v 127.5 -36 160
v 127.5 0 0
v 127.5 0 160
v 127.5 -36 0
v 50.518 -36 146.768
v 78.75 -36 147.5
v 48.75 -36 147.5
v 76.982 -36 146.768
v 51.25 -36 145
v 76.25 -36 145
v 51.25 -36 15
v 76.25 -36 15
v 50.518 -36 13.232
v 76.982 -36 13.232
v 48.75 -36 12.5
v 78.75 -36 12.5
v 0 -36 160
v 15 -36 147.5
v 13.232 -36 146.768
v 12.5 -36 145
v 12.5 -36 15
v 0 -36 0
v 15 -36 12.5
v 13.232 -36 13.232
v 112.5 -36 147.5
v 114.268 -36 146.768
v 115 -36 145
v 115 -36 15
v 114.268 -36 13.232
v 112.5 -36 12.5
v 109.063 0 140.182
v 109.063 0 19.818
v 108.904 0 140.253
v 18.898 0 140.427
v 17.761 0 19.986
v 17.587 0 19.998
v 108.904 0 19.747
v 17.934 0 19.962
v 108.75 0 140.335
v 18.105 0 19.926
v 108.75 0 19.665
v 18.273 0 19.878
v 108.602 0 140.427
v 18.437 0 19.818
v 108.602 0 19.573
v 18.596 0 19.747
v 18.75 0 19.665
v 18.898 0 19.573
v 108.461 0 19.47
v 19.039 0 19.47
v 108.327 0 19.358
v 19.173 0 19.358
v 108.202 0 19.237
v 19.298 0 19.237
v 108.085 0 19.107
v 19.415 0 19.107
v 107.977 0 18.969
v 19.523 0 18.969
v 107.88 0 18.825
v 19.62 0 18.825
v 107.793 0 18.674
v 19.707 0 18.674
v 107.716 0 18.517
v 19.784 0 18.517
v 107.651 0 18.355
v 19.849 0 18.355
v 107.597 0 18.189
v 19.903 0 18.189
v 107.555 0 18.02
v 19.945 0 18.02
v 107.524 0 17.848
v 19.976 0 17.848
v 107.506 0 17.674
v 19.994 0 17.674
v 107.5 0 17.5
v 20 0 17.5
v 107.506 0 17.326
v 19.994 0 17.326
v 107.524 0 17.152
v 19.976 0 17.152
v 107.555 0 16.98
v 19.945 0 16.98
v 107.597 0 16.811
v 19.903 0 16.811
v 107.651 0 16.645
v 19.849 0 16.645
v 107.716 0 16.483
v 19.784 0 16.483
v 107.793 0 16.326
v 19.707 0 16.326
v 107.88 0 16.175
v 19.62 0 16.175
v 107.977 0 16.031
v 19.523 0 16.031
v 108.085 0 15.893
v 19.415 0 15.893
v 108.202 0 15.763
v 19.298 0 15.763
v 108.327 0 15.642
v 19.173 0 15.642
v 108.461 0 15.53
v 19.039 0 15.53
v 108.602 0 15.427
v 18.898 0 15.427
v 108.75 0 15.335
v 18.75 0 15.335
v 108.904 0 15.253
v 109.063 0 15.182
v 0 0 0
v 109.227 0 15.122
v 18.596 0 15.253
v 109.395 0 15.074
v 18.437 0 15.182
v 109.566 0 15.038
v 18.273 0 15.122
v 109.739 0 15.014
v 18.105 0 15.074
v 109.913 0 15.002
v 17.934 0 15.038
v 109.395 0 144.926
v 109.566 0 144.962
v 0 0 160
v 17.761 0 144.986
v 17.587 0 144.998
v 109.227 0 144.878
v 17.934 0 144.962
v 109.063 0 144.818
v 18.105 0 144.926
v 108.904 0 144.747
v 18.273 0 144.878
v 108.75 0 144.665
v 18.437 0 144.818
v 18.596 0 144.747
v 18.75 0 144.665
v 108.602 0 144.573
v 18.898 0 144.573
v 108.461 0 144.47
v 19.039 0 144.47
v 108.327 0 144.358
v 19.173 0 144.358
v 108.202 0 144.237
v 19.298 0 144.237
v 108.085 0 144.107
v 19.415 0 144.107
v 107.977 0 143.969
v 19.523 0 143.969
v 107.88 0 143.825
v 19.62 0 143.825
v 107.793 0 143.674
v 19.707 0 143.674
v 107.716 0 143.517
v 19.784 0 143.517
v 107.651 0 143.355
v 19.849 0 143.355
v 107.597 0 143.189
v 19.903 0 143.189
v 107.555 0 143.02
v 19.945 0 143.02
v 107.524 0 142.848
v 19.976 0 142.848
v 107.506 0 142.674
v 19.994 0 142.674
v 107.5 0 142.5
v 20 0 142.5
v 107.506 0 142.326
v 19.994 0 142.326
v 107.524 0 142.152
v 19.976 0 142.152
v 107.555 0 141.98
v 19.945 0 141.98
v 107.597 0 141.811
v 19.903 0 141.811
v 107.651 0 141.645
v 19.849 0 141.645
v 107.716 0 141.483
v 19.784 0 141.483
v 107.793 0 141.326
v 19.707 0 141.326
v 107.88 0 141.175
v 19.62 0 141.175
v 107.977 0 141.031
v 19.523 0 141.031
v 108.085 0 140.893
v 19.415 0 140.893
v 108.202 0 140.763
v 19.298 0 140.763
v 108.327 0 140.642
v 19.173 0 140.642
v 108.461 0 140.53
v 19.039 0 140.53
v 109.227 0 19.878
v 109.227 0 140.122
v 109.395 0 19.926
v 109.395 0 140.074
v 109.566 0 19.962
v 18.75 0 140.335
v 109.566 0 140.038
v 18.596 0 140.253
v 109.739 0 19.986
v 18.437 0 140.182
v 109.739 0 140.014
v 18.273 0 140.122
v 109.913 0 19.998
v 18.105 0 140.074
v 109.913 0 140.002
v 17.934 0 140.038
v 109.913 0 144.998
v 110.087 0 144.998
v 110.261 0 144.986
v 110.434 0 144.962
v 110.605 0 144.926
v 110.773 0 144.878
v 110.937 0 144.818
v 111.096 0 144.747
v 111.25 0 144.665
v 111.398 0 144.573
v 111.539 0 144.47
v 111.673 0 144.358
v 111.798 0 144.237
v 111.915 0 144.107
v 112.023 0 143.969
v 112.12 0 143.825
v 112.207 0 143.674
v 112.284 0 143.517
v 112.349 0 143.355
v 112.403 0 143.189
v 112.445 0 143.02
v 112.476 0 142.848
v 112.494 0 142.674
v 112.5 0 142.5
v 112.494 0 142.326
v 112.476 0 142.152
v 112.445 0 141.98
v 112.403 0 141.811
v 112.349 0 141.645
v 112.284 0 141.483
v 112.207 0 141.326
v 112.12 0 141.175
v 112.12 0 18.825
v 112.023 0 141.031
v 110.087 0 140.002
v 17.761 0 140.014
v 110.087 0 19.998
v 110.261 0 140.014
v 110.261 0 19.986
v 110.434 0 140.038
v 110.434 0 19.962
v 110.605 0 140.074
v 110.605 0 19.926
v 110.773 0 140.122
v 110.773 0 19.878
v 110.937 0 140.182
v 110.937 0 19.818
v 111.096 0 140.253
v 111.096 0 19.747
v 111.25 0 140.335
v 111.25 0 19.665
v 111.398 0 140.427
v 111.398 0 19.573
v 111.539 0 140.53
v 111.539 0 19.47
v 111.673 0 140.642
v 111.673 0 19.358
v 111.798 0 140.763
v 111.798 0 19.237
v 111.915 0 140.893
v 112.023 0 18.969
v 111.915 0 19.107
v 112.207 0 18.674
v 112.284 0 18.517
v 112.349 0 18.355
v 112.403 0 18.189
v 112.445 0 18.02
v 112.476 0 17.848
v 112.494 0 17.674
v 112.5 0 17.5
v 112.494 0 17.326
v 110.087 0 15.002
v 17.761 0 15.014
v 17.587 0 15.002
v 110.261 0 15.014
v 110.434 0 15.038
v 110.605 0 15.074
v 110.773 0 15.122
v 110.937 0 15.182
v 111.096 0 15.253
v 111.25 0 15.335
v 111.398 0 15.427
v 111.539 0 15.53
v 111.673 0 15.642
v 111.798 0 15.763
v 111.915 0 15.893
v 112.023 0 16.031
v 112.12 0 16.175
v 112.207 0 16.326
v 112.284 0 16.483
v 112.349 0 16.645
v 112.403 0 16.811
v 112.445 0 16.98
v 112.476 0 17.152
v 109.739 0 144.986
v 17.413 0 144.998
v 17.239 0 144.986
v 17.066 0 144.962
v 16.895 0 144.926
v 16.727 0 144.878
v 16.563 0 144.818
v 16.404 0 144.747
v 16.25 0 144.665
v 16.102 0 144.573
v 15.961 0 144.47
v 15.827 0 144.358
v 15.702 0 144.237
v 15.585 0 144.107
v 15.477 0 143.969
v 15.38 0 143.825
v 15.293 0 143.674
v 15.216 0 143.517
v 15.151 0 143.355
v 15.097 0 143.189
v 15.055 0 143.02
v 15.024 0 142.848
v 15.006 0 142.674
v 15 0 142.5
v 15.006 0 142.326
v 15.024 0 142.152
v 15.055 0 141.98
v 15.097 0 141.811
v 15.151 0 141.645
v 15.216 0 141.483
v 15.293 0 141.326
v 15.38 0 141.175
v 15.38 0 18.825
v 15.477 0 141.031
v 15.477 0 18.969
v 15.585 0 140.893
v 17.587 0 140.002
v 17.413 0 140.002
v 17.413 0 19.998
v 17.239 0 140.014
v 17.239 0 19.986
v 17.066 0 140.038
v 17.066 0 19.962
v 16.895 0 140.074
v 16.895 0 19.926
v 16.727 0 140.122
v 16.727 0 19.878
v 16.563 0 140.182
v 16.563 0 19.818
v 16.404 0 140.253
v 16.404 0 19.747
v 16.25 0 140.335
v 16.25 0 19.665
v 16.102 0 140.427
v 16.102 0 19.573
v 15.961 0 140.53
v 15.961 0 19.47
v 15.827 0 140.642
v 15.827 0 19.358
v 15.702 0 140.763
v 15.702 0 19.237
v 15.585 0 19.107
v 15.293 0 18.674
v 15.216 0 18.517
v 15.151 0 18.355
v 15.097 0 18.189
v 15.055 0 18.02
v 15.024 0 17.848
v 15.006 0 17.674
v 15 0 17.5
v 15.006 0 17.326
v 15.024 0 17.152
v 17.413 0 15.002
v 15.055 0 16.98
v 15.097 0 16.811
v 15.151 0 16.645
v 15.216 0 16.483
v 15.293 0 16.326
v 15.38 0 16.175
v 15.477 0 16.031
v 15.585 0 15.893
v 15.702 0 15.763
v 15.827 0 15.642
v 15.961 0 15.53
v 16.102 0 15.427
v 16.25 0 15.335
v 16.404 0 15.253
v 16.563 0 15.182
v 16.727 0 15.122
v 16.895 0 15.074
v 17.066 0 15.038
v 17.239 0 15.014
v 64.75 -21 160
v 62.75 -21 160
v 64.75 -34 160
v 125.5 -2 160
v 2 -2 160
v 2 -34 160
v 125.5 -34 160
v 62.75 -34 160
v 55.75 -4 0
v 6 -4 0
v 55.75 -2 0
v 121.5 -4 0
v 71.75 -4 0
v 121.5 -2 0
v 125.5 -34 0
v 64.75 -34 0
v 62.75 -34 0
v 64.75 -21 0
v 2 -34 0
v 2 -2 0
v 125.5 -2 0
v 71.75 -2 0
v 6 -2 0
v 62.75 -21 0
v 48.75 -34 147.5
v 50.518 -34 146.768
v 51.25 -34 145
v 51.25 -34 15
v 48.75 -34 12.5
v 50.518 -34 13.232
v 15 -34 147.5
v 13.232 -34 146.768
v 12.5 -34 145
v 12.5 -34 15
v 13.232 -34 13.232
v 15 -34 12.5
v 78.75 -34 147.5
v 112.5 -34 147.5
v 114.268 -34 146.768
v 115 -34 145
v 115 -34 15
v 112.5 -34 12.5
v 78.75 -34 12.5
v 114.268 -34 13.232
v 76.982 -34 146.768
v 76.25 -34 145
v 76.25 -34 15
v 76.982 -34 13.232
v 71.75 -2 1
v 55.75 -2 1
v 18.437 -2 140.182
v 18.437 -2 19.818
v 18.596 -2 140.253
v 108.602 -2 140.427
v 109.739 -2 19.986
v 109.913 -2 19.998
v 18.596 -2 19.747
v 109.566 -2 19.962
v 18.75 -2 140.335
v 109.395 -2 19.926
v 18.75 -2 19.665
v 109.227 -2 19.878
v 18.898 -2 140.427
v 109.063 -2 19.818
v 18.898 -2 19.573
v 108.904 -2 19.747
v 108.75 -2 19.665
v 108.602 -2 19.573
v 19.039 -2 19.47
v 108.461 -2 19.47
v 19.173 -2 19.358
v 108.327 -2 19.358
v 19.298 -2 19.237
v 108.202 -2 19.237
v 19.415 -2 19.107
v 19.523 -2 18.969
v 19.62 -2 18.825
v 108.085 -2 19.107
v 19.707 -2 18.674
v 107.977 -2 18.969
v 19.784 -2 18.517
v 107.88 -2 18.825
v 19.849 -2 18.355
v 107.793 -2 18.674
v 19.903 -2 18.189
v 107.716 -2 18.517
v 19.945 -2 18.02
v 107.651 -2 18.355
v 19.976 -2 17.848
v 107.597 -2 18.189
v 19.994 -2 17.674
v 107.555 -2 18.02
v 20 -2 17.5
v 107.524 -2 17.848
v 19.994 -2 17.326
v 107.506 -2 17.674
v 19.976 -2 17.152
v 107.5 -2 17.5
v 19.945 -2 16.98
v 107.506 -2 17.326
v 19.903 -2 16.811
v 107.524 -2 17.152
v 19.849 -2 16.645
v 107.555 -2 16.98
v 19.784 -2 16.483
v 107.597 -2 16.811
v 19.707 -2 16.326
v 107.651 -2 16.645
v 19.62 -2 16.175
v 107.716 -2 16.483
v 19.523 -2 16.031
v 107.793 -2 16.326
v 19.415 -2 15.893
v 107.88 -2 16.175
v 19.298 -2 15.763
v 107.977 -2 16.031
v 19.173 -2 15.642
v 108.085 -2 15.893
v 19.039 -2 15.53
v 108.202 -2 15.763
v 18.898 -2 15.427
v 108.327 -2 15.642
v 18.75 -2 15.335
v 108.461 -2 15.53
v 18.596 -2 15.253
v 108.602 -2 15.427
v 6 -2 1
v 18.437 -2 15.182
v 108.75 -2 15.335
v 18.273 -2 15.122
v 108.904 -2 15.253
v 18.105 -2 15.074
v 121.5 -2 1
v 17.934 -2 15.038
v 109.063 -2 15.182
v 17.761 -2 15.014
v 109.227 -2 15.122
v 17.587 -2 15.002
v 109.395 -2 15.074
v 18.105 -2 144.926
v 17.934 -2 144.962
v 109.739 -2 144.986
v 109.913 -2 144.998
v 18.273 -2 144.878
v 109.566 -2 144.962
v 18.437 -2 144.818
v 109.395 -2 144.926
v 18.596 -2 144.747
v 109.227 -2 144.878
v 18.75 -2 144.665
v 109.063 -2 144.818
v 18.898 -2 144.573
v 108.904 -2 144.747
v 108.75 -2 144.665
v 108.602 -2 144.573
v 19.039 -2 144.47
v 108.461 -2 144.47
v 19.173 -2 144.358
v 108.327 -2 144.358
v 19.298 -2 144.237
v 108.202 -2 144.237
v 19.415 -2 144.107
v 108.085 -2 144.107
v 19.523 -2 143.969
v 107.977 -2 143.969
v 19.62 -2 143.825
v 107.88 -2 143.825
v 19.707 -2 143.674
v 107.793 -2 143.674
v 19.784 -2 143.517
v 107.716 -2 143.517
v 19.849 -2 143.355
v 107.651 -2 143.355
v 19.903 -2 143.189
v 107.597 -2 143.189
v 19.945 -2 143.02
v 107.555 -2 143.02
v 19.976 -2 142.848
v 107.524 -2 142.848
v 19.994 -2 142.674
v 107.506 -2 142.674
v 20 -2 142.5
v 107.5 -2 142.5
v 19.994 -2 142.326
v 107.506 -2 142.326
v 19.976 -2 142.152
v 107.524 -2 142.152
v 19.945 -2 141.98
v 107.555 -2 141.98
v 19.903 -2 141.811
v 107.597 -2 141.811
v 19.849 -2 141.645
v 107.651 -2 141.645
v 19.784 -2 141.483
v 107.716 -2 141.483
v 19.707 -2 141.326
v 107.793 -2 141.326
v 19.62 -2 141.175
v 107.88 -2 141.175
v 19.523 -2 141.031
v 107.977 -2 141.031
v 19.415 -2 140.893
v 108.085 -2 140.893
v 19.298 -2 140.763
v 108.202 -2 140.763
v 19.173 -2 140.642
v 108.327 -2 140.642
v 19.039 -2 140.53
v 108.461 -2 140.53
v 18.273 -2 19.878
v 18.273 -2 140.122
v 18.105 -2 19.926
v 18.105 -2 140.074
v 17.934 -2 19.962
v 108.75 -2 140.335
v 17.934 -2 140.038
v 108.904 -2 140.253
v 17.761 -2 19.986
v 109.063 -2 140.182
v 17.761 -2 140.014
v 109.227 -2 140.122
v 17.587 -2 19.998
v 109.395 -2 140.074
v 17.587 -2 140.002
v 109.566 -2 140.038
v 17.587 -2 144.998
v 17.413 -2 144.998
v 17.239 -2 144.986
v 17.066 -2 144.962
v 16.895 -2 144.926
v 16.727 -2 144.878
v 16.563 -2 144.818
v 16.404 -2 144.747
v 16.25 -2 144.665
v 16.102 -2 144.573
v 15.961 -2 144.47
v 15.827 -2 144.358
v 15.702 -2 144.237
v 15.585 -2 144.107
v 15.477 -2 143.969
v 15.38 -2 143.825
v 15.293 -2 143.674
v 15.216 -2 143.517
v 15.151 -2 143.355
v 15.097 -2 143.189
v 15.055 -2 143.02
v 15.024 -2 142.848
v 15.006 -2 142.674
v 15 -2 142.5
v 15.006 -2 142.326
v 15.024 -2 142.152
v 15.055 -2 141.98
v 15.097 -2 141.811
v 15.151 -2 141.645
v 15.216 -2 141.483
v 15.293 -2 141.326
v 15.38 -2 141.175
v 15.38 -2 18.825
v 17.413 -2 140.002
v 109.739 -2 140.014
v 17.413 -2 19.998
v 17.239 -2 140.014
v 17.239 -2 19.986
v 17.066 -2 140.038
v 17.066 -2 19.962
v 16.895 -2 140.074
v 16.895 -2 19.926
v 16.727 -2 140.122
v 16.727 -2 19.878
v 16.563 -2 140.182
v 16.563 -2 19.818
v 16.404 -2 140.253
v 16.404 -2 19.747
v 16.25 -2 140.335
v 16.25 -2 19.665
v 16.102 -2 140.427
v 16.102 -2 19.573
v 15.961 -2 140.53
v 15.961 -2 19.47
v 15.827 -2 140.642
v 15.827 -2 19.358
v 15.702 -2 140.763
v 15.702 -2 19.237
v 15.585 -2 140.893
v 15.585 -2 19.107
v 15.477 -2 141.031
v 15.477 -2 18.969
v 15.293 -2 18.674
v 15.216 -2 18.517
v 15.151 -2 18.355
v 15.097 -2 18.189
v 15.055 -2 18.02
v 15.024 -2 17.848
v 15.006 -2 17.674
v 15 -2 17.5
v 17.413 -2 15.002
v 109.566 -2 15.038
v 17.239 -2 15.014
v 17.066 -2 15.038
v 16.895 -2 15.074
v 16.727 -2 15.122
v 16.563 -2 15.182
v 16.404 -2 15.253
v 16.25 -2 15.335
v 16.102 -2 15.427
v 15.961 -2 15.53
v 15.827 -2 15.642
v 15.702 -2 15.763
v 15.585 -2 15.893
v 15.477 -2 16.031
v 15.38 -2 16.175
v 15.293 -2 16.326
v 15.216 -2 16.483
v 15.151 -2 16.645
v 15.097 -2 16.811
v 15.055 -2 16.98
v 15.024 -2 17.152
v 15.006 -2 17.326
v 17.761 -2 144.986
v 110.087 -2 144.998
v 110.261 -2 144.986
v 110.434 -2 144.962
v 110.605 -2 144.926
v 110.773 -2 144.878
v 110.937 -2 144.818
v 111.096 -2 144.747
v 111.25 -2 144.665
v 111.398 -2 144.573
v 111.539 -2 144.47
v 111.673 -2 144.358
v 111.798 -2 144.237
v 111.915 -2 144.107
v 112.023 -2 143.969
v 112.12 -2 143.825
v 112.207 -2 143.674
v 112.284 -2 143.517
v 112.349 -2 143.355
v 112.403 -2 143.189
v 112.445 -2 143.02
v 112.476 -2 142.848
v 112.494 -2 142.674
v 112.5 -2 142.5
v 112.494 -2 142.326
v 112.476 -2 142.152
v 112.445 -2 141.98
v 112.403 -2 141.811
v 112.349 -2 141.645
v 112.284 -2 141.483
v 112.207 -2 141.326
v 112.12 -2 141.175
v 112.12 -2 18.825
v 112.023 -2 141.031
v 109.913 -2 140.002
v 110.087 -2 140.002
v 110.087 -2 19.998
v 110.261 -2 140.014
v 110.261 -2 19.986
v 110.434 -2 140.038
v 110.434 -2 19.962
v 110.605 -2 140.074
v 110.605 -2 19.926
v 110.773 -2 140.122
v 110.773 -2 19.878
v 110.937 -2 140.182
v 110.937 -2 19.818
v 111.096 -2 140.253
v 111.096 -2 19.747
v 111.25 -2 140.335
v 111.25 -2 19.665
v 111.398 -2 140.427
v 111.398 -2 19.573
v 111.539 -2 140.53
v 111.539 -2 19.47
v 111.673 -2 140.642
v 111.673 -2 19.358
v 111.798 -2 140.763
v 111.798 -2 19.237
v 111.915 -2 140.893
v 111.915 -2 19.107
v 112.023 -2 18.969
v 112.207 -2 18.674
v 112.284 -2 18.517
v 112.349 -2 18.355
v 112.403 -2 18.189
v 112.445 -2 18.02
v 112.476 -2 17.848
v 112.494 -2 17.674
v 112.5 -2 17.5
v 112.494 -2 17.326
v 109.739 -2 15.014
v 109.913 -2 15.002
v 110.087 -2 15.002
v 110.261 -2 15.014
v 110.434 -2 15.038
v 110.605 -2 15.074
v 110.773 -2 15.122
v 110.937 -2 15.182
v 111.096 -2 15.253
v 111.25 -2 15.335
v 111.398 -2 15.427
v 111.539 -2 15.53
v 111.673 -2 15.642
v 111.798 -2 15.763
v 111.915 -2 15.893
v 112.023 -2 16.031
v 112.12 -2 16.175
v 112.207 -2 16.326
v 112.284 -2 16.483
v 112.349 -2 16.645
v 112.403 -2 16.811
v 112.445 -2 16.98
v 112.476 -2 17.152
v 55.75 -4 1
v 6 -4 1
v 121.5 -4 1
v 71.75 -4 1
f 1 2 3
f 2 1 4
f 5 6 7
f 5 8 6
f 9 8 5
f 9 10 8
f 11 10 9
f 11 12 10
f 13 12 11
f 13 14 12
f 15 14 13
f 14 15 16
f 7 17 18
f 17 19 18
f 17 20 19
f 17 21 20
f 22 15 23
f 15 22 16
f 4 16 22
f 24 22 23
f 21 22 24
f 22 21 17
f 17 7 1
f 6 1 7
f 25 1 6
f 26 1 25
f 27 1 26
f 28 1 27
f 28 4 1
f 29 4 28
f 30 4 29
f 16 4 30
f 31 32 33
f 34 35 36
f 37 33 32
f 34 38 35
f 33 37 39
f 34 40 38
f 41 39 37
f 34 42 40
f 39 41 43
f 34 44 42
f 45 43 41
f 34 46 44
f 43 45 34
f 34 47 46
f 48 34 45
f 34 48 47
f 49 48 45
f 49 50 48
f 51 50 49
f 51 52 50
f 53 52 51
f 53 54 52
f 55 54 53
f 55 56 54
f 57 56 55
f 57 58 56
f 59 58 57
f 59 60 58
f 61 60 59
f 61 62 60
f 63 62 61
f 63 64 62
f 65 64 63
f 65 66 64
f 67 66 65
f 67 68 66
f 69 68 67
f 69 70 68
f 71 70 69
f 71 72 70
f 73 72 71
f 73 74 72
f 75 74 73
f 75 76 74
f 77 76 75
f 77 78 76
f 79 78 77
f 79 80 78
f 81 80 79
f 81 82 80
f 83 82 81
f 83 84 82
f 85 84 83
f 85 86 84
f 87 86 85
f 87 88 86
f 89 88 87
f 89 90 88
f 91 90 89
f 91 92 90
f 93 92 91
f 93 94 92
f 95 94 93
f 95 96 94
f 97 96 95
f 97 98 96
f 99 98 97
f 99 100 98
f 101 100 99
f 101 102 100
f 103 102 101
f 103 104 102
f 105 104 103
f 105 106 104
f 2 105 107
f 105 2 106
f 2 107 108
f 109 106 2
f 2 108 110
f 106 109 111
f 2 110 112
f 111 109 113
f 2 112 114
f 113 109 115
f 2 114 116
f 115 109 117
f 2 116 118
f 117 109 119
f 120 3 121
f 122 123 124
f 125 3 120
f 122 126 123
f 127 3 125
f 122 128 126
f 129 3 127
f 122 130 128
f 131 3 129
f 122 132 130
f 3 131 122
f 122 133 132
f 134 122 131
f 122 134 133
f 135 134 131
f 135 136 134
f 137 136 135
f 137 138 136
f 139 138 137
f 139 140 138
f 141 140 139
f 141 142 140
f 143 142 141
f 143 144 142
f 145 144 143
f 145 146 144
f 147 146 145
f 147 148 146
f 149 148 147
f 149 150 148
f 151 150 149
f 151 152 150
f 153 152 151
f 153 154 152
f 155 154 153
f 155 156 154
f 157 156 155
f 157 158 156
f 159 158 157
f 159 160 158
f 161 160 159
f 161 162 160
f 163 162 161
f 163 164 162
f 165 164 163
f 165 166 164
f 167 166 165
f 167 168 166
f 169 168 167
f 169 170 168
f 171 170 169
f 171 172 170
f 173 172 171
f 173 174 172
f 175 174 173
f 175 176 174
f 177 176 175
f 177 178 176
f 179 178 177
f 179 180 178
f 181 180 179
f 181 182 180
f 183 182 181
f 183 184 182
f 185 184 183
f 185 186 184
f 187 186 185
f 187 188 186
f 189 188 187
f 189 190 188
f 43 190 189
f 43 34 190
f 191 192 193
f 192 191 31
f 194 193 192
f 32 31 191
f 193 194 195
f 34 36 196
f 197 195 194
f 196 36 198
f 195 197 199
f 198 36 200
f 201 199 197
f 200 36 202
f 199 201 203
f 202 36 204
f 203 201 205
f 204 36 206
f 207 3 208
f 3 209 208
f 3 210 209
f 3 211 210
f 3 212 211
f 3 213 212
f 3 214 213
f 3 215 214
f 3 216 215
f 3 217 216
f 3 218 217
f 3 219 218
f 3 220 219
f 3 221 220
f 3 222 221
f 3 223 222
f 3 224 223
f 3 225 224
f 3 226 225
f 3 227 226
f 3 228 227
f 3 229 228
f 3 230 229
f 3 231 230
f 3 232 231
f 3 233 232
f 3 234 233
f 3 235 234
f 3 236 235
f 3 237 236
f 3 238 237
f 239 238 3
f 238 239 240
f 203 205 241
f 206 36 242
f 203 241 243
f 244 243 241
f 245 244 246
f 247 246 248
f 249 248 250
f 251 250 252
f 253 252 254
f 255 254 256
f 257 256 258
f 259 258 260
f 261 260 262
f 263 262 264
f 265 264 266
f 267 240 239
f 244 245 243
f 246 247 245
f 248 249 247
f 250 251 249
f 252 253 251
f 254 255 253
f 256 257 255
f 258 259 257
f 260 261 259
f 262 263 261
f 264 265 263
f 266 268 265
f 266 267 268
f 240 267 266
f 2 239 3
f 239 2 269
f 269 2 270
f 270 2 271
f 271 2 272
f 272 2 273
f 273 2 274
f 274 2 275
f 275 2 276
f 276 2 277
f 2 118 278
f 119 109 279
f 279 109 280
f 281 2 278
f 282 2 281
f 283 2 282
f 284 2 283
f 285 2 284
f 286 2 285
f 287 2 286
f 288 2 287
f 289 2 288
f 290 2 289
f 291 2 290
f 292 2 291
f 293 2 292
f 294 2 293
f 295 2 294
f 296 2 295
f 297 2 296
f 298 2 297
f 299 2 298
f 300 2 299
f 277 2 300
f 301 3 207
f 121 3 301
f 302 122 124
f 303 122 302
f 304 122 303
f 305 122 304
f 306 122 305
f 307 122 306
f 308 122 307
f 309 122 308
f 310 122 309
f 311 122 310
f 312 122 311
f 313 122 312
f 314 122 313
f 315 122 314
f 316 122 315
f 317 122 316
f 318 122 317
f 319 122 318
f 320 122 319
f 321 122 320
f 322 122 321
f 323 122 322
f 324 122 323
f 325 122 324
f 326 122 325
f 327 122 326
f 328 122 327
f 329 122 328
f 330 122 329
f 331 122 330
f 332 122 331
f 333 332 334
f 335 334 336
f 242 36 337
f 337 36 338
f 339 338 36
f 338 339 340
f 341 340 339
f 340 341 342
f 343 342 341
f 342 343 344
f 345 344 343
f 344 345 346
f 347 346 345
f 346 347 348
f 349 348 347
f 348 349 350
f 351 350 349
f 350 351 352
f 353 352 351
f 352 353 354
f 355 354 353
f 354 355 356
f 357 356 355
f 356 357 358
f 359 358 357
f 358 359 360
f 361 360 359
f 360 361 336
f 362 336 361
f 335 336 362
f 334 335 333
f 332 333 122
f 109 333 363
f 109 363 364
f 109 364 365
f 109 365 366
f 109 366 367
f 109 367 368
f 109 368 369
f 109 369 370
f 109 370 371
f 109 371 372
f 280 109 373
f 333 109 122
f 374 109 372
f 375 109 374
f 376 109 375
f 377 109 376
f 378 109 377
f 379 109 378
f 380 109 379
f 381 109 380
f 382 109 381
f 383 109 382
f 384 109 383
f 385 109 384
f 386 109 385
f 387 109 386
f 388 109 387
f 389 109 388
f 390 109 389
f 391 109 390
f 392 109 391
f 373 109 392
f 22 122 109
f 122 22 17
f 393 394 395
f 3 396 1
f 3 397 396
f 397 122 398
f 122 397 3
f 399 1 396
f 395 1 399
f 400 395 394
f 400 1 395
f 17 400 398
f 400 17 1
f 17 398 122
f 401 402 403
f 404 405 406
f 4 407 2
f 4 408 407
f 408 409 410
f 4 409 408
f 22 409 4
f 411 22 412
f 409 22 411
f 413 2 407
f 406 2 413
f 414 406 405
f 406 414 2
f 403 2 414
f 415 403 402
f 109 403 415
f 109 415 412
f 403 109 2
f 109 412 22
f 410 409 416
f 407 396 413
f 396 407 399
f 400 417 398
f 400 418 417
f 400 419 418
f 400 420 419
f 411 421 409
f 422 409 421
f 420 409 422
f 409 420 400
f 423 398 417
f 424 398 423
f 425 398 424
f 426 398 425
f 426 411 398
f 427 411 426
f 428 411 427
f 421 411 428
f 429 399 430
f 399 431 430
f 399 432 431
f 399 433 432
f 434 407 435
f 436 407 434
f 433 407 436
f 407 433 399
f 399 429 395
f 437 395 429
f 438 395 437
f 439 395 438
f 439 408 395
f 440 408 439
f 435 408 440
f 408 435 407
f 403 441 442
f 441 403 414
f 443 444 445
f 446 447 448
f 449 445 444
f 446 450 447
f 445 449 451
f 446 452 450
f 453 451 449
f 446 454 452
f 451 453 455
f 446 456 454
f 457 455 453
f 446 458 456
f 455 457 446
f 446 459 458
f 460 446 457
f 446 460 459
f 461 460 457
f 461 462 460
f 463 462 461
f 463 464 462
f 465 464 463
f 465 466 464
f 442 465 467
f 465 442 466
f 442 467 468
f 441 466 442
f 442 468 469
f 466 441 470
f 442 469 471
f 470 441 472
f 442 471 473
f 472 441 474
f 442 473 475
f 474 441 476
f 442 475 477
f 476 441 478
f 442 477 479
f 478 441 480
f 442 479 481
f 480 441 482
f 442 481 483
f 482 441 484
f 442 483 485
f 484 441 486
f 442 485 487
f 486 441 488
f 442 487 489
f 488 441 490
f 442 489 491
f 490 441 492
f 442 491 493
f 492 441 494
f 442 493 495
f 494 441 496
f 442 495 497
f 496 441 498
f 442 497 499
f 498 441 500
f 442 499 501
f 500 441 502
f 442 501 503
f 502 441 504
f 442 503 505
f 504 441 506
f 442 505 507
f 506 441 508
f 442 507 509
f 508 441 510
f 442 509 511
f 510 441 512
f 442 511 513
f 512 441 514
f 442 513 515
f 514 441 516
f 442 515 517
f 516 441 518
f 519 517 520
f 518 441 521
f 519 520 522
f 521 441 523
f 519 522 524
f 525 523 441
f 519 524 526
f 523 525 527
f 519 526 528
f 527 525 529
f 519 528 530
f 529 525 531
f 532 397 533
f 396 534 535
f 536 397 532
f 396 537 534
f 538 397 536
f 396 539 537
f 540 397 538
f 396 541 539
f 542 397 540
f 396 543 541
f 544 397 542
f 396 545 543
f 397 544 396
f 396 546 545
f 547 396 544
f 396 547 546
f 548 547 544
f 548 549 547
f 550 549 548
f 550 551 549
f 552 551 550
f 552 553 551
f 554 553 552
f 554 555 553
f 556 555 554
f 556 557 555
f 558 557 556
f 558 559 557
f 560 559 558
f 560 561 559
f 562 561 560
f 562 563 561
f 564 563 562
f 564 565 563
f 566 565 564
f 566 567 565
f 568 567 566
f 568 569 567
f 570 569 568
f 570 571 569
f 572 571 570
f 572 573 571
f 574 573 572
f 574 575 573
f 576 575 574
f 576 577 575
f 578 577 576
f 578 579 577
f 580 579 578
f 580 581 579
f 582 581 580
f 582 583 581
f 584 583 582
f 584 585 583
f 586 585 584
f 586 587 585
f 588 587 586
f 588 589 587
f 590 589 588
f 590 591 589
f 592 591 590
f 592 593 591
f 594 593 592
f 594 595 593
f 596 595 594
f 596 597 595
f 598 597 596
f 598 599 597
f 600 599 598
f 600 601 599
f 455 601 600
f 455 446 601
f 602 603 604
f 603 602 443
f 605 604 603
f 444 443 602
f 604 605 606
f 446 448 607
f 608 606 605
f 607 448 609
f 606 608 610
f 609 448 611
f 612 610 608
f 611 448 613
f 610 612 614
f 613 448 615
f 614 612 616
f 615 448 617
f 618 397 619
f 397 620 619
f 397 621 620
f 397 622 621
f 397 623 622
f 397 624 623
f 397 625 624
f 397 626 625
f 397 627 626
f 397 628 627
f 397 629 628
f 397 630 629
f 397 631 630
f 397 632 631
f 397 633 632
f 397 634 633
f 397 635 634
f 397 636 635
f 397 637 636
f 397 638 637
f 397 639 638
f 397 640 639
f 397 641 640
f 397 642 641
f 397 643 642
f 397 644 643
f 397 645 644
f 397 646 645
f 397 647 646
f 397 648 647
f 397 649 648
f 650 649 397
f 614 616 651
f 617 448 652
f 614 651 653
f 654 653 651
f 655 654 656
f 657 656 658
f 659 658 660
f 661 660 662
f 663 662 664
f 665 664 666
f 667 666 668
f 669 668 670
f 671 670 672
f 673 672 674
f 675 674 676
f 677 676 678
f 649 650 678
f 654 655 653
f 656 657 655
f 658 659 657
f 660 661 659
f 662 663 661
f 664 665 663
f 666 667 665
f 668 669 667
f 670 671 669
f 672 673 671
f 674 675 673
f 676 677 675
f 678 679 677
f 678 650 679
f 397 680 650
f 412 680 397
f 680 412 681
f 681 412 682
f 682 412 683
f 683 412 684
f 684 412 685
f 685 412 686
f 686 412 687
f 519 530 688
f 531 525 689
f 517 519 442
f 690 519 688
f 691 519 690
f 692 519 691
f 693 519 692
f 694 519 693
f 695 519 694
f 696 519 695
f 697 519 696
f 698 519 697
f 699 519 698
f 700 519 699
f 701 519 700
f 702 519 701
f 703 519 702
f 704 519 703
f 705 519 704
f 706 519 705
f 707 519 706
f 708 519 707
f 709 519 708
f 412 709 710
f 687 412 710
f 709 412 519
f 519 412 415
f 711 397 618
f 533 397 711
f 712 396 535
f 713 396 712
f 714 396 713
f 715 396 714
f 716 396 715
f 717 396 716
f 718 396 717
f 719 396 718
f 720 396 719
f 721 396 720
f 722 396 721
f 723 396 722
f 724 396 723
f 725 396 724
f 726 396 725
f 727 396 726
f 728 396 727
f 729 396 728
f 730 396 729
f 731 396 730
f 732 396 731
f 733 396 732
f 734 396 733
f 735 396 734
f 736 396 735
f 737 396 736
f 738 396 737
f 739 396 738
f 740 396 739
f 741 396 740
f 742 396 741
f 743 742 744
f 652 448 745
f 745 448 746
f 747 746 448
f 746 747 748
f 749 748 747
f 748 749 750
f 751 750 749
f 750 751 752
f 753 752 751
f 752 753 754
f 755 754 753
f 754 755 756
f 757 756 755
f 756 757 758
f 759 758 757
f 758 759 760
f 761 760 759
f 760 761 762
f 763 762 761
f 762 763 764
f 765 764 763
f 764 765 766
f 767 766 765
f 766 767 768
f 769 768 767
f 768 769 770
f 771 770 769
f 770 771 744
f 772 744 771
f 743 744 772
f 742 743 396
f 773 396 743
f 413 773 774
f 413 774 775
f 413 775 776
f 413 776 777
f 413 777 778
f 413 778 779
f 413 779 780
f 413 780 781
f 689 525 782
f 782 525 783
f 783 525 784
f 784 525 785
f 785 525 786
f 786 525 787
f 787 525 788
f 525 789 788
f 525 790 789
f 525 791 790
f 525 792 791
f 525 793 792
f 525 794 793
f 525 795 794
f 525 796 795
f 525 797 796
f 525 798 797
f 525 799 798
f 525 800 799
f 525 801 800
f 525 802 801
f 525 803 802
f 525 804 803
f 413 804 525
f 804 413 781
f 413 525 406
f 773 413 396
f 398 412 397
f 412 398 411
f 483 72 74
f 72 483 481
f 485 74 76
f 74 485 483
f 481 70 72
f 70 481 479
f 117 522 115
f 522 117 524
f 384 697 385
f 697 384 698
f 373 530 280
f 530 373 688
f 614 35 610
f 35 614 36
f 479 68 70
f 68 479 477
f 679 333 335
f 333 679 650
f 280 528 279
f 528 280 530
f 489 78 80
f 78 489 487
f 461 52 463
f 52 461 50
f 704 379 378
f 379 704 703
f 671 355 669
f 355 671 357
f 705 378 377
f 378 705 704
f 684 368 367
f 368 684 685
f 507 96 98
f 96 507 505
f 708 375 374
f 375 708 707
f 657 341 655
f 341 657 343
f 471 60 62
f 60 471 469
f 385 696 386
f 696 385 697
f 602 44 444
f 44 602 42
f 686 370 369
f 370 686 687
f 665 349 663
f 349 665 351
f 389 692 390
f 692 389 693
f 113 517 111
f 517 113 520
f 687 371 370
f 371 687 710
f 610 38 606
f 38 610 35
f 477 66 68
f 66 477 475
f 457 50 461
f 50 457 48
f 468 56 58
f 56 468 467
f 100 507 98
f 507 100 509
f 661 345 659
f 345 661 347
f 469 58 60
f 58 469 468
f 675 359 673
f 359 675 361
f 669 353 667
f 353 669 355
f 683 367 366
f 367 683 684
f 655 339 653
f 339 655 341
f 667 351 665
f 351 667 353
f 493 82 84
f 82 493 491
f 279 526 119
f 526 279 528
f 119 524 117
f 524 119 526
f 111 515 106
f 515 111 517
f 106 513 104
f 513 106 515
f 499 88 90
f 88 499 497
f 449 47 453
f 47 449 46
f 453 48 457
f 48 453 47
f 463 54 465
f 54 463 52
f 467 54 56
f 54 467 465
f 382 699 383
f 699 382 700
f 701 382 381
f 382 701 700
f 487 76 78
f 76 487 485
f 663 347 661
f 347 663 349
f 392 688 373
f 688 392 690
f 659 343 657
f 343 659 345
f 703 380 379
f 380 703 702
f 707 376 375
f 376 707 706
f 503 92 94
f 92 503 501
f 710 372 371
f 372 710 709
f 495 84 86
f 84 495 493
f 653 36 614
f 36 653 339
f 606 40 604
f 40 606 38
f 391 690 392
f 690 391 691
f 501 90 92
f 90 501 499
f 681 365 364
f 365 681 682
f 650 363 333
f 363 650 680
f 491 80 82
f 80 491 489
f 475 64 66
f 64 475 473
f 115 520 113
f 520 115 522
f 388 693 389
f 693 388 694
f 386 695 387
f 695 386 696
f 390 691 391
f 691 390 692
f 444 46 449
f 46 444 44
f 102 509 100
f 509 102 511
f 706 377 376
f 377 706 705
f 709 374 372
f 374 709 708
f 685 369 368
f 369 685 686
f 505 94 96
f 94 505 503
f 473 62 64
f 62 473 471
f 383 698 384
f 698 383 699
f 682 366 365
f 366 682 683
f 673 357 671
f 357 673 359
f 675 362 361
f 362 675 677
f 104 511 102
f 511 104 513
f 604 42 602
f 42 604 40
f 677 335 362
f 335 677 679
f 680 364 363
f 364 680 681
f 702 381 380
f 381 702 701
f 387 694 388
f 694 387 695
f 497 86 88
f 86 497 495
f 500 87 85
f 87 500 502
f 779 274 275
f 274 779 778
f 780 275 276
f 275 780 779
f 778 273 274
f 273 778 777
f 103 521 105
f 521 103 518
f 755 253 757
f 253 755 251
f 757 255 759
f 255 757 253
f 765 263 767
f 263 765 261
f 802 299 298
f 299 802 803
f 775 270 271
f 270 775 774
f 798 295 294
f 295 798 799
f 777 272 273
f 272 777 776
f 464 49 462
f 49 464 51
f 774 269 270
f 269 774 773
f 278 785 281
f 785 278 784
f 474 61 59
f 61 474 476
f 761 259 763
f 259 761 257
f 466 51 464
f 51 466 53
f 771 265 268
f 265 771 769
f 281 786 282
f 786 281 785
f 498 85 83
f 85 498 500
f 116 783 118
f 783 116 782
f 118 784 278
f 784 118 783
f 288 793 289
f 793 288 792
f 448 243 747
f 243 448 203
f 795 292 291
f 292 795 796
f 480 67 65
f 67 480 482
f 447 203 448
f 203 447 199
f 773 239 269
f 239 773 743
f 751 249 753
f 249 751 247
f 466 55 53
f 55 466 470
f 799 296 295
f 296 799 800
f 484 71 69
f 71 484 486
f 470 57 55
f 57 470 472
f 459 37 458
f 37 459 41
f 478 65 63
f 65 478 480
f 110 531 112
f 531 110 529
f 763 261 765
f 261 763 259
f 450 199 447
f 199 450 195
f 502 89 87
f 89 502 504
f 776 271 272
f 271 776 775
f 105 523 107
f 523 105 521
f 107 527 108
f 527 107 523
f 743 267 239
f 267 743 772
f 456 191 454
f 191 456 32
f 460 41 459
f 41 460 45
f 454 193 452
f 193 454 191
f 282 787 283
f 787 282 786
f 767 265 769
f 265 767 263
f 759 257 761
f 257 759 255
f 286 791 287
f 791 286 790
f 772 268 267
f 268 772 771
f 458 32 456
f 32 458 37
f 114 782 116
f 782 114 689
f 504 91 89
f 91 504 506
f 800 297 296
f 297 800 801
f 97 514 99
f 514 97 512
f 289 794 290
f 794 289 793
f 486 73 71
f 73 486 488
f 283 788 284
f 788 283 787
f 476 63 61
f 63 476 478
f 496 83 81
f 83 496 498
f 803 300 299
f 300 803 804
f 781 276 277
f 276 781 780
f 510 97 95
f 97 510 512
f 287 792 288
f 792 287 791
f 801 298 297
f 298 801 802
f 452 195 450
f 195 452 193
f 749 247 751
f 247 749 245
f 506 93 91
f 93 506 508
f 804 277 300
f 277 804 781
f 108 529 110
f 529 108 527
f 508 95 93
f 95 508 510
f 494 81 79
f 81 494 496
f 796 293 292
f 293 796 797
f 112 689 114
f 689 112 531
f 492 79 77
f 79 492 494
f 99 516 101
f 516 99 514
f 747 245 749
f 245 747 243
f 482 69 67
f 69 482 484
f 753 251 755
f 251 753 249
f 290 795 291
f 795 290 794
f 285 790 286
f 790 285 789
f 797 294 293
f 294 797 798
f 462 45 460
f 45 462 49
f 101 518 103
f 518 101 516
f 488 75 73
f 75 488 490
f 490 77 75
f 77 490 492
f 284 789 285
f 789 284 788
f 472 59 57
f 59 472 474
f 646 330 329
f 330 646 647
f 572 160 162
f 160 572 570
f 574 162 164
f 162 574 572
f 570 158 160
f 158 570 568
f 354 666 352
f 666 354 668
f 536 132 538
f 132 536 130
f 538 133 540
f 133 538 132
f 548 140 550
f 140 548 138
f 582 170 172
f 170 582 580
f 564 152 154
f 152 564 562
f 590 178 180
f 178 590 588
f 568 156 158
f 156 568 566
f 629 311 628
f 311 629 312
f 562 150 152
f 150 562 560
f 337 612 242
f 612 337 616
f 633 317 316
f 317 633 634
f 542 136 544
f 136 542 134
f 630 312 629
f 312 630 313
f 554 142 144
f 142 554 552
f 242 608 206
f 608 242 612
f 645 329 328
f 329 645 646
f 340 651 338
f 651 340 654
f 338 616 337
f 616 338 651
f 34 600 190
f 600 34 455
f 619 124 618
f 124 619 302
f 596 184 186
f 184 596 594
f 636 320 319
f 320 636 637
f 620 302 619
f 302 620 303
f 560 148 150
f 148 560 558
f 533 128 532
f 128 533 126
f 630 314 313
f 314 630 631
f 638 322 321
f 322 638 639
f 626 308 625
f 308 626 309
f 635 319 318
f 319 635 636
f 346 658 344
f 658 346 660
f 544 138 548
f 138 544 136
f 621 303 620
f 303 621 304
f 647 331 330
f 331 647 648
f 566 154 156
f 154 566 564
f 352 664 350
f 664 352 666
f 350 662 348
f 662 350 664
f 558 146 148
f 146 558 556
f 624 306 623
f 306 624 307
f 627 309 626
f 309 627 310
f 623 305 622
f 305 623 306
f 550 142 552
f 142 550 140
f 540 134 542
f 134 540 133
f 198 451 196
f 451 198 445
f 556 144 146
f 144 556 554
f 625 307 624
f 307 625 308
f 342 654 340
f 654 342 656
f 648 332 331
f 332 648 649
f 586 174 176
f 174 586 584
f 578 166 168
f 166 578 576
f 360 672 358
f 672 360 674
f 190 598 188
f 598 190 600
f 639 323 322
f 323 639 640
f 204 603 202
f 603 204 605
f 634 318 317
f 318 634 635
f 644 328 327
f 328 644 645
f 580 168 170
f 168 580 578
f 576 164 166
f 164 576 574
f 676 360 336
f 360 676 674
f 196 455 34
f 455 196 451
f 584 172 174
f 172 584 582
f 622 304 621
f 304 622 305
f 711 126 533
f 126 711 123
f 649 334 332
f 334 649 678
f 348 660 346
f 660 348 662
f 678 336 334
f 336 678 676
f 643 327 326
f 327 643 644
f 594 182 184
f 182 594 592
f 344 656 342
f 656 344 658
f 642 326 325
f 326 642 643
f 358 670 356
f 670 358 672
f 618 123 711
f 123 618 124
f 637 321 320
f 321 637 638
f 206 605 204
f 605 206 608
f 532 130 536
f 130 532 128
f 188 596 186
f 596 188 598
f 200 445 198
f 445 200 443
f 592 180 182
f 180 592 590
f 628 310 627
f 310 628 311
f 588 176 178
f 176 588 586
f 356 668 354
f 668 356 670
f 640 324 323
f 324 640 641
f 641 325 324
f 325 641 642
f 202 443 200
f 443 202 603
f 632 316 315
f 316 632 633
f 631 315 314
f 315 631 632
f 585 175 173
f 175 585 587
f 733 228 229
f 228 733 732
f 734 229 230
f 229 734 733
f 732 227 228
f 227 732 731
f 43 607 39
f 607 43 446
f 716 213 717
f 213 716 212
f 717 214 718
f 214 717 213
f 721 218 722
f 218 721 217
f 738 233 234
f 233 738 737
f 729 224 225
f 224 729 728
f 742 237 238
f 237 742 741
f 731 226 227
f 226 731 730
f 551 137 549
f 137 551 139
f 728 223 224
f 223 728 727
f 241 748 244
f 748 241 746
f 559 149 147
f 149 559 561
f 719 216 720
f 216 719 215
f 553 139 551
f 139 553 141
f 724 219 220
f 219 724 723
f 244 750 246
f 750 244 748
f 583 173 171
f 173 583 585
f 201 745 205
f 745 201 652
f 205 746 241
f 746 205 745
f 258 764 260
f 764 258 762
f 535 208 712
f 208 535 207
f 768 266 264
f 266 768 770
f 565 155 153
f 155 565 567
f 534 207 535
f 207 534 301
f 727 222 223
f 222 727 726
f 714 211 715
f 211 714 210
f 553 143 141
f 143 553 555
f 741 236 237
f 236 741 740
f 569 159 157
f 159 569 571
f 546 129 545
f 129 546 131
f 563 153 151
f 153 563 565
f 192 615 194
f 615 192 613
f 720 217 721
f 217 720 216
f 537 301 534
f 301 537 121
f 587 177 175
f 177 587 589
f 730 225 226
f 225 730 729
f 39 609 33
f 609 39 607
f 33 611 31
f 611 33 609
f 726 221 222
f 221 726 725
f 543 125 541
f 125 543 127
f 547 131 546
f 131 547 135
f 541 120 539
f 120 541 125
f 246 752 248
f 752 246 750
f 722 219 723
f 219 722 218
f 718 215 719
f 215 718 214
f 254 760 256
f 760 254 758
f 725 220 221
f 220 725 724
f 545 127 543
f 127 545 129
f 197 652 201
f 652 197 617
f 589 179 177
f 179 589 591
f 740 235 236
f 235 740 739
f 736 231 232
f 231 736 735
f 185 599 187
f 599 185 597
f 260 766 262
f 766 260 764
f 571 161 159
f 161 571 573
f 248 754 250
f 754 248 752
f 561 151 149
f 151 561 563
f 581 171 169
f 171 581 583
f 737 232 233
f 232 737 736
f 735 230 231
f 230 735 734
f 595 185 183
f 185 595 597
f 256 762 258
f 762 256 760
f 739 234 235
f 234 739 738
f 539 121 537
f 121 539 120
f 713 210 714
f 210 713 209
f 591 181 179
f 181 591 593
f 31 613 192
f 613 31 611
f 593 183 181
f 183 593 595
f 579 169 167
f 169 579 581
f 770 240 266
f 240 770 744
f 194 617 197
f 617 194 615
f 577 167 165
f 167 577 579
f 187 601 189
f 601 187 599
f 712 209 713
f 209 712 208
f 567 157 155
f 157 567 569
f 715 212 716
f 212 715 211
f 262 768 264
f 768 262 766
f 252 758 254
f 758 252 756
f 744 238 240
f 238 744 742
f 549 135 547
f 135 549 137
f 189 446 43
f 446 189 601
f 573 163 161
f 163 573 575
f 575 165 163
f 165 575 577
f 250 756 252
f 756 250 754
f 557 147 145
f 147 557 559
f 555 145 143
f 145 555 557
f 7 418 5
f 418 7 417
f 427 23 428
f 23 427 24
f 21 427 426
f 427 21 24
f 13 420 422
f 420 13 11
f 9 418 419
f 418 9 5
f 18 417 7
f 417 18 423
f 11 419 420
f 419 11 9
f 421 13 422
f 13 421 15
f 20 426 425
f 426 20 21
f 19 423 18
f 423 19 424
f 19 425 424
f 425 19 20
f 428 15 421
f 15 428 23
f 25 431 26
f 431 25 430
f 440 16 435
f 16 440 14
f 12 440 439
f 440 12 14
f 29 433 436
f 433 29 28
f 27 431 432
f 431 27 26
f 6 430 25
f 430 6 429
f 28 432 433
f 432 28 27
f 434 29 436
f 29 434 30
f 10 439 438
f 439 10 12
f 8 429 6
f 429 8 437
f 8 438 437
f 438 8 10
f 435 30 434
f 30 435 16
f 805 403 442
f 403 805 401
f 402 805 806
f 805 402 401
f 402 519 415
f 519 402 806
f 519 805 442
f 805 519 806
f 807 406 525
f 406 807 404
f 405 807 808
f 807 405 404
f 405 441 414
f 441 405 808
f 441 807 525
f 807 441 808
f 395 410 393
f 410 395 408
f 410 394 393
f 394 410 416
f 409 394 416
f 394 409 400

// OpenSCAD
wall=2;
depth=160;
hole_d = 5;
hole_spacing = 92.5;
hole_offset = 15+hole_d/2;
width = hole_offset*2+hole_spacing;
height=30+wall*3;


rotate([90,0,0]) union(){
    difference() {
        cube([width,depth,height]);
        translate([wall,0,wall]) cube([width-wall*2,depth,height-wall*2]);
        translate([hole_offset,hole_offset,0]) cylinder(d=5,h=10,$fn=90);
        translate([width-hole_offset,hole_offset,0]) cylinder(d=5,h=10,$fn=90);
        translate([hole_offset,depth-hole_offset,0]) cylinder(d=5,h=10,$fn=90);
        translate([width-hole_offset,depth-hole_offset,0]) cylinder(d=5,h=10,$fn=90);
        translate([hole_offset-2.5,hole_offset-2.5,height-3])upper_cut();
        translate([width-hole_spacing/2-2.5,hole_offset-2.5,height-3])upper_cut();
    }

    stoppers = (width-wall*2)/2-wall*6;
    translate([wall*3,0,0]) cube([stoppers,1,wall*2]);
    translate([width-wall*3-stoppers,0,0]) cube([stoppers,1,wall*2]);
    translate([width/2-wall/2,0,height-15]) cube([wall,depth,15]);
}

module upper_cut() {
    linear_extrude(height=5) {
        w = hole_spacing/2-hole_offset+5;
        d = depth-hole_offset*2+5;
        hull() {
            circle(d=5);
            translate([w,0,0]) circle(d=5);
            translate([0,d,0]) circle(d=5);
            translate([w,d,0]) circle(d=5);
        }
    }
}
